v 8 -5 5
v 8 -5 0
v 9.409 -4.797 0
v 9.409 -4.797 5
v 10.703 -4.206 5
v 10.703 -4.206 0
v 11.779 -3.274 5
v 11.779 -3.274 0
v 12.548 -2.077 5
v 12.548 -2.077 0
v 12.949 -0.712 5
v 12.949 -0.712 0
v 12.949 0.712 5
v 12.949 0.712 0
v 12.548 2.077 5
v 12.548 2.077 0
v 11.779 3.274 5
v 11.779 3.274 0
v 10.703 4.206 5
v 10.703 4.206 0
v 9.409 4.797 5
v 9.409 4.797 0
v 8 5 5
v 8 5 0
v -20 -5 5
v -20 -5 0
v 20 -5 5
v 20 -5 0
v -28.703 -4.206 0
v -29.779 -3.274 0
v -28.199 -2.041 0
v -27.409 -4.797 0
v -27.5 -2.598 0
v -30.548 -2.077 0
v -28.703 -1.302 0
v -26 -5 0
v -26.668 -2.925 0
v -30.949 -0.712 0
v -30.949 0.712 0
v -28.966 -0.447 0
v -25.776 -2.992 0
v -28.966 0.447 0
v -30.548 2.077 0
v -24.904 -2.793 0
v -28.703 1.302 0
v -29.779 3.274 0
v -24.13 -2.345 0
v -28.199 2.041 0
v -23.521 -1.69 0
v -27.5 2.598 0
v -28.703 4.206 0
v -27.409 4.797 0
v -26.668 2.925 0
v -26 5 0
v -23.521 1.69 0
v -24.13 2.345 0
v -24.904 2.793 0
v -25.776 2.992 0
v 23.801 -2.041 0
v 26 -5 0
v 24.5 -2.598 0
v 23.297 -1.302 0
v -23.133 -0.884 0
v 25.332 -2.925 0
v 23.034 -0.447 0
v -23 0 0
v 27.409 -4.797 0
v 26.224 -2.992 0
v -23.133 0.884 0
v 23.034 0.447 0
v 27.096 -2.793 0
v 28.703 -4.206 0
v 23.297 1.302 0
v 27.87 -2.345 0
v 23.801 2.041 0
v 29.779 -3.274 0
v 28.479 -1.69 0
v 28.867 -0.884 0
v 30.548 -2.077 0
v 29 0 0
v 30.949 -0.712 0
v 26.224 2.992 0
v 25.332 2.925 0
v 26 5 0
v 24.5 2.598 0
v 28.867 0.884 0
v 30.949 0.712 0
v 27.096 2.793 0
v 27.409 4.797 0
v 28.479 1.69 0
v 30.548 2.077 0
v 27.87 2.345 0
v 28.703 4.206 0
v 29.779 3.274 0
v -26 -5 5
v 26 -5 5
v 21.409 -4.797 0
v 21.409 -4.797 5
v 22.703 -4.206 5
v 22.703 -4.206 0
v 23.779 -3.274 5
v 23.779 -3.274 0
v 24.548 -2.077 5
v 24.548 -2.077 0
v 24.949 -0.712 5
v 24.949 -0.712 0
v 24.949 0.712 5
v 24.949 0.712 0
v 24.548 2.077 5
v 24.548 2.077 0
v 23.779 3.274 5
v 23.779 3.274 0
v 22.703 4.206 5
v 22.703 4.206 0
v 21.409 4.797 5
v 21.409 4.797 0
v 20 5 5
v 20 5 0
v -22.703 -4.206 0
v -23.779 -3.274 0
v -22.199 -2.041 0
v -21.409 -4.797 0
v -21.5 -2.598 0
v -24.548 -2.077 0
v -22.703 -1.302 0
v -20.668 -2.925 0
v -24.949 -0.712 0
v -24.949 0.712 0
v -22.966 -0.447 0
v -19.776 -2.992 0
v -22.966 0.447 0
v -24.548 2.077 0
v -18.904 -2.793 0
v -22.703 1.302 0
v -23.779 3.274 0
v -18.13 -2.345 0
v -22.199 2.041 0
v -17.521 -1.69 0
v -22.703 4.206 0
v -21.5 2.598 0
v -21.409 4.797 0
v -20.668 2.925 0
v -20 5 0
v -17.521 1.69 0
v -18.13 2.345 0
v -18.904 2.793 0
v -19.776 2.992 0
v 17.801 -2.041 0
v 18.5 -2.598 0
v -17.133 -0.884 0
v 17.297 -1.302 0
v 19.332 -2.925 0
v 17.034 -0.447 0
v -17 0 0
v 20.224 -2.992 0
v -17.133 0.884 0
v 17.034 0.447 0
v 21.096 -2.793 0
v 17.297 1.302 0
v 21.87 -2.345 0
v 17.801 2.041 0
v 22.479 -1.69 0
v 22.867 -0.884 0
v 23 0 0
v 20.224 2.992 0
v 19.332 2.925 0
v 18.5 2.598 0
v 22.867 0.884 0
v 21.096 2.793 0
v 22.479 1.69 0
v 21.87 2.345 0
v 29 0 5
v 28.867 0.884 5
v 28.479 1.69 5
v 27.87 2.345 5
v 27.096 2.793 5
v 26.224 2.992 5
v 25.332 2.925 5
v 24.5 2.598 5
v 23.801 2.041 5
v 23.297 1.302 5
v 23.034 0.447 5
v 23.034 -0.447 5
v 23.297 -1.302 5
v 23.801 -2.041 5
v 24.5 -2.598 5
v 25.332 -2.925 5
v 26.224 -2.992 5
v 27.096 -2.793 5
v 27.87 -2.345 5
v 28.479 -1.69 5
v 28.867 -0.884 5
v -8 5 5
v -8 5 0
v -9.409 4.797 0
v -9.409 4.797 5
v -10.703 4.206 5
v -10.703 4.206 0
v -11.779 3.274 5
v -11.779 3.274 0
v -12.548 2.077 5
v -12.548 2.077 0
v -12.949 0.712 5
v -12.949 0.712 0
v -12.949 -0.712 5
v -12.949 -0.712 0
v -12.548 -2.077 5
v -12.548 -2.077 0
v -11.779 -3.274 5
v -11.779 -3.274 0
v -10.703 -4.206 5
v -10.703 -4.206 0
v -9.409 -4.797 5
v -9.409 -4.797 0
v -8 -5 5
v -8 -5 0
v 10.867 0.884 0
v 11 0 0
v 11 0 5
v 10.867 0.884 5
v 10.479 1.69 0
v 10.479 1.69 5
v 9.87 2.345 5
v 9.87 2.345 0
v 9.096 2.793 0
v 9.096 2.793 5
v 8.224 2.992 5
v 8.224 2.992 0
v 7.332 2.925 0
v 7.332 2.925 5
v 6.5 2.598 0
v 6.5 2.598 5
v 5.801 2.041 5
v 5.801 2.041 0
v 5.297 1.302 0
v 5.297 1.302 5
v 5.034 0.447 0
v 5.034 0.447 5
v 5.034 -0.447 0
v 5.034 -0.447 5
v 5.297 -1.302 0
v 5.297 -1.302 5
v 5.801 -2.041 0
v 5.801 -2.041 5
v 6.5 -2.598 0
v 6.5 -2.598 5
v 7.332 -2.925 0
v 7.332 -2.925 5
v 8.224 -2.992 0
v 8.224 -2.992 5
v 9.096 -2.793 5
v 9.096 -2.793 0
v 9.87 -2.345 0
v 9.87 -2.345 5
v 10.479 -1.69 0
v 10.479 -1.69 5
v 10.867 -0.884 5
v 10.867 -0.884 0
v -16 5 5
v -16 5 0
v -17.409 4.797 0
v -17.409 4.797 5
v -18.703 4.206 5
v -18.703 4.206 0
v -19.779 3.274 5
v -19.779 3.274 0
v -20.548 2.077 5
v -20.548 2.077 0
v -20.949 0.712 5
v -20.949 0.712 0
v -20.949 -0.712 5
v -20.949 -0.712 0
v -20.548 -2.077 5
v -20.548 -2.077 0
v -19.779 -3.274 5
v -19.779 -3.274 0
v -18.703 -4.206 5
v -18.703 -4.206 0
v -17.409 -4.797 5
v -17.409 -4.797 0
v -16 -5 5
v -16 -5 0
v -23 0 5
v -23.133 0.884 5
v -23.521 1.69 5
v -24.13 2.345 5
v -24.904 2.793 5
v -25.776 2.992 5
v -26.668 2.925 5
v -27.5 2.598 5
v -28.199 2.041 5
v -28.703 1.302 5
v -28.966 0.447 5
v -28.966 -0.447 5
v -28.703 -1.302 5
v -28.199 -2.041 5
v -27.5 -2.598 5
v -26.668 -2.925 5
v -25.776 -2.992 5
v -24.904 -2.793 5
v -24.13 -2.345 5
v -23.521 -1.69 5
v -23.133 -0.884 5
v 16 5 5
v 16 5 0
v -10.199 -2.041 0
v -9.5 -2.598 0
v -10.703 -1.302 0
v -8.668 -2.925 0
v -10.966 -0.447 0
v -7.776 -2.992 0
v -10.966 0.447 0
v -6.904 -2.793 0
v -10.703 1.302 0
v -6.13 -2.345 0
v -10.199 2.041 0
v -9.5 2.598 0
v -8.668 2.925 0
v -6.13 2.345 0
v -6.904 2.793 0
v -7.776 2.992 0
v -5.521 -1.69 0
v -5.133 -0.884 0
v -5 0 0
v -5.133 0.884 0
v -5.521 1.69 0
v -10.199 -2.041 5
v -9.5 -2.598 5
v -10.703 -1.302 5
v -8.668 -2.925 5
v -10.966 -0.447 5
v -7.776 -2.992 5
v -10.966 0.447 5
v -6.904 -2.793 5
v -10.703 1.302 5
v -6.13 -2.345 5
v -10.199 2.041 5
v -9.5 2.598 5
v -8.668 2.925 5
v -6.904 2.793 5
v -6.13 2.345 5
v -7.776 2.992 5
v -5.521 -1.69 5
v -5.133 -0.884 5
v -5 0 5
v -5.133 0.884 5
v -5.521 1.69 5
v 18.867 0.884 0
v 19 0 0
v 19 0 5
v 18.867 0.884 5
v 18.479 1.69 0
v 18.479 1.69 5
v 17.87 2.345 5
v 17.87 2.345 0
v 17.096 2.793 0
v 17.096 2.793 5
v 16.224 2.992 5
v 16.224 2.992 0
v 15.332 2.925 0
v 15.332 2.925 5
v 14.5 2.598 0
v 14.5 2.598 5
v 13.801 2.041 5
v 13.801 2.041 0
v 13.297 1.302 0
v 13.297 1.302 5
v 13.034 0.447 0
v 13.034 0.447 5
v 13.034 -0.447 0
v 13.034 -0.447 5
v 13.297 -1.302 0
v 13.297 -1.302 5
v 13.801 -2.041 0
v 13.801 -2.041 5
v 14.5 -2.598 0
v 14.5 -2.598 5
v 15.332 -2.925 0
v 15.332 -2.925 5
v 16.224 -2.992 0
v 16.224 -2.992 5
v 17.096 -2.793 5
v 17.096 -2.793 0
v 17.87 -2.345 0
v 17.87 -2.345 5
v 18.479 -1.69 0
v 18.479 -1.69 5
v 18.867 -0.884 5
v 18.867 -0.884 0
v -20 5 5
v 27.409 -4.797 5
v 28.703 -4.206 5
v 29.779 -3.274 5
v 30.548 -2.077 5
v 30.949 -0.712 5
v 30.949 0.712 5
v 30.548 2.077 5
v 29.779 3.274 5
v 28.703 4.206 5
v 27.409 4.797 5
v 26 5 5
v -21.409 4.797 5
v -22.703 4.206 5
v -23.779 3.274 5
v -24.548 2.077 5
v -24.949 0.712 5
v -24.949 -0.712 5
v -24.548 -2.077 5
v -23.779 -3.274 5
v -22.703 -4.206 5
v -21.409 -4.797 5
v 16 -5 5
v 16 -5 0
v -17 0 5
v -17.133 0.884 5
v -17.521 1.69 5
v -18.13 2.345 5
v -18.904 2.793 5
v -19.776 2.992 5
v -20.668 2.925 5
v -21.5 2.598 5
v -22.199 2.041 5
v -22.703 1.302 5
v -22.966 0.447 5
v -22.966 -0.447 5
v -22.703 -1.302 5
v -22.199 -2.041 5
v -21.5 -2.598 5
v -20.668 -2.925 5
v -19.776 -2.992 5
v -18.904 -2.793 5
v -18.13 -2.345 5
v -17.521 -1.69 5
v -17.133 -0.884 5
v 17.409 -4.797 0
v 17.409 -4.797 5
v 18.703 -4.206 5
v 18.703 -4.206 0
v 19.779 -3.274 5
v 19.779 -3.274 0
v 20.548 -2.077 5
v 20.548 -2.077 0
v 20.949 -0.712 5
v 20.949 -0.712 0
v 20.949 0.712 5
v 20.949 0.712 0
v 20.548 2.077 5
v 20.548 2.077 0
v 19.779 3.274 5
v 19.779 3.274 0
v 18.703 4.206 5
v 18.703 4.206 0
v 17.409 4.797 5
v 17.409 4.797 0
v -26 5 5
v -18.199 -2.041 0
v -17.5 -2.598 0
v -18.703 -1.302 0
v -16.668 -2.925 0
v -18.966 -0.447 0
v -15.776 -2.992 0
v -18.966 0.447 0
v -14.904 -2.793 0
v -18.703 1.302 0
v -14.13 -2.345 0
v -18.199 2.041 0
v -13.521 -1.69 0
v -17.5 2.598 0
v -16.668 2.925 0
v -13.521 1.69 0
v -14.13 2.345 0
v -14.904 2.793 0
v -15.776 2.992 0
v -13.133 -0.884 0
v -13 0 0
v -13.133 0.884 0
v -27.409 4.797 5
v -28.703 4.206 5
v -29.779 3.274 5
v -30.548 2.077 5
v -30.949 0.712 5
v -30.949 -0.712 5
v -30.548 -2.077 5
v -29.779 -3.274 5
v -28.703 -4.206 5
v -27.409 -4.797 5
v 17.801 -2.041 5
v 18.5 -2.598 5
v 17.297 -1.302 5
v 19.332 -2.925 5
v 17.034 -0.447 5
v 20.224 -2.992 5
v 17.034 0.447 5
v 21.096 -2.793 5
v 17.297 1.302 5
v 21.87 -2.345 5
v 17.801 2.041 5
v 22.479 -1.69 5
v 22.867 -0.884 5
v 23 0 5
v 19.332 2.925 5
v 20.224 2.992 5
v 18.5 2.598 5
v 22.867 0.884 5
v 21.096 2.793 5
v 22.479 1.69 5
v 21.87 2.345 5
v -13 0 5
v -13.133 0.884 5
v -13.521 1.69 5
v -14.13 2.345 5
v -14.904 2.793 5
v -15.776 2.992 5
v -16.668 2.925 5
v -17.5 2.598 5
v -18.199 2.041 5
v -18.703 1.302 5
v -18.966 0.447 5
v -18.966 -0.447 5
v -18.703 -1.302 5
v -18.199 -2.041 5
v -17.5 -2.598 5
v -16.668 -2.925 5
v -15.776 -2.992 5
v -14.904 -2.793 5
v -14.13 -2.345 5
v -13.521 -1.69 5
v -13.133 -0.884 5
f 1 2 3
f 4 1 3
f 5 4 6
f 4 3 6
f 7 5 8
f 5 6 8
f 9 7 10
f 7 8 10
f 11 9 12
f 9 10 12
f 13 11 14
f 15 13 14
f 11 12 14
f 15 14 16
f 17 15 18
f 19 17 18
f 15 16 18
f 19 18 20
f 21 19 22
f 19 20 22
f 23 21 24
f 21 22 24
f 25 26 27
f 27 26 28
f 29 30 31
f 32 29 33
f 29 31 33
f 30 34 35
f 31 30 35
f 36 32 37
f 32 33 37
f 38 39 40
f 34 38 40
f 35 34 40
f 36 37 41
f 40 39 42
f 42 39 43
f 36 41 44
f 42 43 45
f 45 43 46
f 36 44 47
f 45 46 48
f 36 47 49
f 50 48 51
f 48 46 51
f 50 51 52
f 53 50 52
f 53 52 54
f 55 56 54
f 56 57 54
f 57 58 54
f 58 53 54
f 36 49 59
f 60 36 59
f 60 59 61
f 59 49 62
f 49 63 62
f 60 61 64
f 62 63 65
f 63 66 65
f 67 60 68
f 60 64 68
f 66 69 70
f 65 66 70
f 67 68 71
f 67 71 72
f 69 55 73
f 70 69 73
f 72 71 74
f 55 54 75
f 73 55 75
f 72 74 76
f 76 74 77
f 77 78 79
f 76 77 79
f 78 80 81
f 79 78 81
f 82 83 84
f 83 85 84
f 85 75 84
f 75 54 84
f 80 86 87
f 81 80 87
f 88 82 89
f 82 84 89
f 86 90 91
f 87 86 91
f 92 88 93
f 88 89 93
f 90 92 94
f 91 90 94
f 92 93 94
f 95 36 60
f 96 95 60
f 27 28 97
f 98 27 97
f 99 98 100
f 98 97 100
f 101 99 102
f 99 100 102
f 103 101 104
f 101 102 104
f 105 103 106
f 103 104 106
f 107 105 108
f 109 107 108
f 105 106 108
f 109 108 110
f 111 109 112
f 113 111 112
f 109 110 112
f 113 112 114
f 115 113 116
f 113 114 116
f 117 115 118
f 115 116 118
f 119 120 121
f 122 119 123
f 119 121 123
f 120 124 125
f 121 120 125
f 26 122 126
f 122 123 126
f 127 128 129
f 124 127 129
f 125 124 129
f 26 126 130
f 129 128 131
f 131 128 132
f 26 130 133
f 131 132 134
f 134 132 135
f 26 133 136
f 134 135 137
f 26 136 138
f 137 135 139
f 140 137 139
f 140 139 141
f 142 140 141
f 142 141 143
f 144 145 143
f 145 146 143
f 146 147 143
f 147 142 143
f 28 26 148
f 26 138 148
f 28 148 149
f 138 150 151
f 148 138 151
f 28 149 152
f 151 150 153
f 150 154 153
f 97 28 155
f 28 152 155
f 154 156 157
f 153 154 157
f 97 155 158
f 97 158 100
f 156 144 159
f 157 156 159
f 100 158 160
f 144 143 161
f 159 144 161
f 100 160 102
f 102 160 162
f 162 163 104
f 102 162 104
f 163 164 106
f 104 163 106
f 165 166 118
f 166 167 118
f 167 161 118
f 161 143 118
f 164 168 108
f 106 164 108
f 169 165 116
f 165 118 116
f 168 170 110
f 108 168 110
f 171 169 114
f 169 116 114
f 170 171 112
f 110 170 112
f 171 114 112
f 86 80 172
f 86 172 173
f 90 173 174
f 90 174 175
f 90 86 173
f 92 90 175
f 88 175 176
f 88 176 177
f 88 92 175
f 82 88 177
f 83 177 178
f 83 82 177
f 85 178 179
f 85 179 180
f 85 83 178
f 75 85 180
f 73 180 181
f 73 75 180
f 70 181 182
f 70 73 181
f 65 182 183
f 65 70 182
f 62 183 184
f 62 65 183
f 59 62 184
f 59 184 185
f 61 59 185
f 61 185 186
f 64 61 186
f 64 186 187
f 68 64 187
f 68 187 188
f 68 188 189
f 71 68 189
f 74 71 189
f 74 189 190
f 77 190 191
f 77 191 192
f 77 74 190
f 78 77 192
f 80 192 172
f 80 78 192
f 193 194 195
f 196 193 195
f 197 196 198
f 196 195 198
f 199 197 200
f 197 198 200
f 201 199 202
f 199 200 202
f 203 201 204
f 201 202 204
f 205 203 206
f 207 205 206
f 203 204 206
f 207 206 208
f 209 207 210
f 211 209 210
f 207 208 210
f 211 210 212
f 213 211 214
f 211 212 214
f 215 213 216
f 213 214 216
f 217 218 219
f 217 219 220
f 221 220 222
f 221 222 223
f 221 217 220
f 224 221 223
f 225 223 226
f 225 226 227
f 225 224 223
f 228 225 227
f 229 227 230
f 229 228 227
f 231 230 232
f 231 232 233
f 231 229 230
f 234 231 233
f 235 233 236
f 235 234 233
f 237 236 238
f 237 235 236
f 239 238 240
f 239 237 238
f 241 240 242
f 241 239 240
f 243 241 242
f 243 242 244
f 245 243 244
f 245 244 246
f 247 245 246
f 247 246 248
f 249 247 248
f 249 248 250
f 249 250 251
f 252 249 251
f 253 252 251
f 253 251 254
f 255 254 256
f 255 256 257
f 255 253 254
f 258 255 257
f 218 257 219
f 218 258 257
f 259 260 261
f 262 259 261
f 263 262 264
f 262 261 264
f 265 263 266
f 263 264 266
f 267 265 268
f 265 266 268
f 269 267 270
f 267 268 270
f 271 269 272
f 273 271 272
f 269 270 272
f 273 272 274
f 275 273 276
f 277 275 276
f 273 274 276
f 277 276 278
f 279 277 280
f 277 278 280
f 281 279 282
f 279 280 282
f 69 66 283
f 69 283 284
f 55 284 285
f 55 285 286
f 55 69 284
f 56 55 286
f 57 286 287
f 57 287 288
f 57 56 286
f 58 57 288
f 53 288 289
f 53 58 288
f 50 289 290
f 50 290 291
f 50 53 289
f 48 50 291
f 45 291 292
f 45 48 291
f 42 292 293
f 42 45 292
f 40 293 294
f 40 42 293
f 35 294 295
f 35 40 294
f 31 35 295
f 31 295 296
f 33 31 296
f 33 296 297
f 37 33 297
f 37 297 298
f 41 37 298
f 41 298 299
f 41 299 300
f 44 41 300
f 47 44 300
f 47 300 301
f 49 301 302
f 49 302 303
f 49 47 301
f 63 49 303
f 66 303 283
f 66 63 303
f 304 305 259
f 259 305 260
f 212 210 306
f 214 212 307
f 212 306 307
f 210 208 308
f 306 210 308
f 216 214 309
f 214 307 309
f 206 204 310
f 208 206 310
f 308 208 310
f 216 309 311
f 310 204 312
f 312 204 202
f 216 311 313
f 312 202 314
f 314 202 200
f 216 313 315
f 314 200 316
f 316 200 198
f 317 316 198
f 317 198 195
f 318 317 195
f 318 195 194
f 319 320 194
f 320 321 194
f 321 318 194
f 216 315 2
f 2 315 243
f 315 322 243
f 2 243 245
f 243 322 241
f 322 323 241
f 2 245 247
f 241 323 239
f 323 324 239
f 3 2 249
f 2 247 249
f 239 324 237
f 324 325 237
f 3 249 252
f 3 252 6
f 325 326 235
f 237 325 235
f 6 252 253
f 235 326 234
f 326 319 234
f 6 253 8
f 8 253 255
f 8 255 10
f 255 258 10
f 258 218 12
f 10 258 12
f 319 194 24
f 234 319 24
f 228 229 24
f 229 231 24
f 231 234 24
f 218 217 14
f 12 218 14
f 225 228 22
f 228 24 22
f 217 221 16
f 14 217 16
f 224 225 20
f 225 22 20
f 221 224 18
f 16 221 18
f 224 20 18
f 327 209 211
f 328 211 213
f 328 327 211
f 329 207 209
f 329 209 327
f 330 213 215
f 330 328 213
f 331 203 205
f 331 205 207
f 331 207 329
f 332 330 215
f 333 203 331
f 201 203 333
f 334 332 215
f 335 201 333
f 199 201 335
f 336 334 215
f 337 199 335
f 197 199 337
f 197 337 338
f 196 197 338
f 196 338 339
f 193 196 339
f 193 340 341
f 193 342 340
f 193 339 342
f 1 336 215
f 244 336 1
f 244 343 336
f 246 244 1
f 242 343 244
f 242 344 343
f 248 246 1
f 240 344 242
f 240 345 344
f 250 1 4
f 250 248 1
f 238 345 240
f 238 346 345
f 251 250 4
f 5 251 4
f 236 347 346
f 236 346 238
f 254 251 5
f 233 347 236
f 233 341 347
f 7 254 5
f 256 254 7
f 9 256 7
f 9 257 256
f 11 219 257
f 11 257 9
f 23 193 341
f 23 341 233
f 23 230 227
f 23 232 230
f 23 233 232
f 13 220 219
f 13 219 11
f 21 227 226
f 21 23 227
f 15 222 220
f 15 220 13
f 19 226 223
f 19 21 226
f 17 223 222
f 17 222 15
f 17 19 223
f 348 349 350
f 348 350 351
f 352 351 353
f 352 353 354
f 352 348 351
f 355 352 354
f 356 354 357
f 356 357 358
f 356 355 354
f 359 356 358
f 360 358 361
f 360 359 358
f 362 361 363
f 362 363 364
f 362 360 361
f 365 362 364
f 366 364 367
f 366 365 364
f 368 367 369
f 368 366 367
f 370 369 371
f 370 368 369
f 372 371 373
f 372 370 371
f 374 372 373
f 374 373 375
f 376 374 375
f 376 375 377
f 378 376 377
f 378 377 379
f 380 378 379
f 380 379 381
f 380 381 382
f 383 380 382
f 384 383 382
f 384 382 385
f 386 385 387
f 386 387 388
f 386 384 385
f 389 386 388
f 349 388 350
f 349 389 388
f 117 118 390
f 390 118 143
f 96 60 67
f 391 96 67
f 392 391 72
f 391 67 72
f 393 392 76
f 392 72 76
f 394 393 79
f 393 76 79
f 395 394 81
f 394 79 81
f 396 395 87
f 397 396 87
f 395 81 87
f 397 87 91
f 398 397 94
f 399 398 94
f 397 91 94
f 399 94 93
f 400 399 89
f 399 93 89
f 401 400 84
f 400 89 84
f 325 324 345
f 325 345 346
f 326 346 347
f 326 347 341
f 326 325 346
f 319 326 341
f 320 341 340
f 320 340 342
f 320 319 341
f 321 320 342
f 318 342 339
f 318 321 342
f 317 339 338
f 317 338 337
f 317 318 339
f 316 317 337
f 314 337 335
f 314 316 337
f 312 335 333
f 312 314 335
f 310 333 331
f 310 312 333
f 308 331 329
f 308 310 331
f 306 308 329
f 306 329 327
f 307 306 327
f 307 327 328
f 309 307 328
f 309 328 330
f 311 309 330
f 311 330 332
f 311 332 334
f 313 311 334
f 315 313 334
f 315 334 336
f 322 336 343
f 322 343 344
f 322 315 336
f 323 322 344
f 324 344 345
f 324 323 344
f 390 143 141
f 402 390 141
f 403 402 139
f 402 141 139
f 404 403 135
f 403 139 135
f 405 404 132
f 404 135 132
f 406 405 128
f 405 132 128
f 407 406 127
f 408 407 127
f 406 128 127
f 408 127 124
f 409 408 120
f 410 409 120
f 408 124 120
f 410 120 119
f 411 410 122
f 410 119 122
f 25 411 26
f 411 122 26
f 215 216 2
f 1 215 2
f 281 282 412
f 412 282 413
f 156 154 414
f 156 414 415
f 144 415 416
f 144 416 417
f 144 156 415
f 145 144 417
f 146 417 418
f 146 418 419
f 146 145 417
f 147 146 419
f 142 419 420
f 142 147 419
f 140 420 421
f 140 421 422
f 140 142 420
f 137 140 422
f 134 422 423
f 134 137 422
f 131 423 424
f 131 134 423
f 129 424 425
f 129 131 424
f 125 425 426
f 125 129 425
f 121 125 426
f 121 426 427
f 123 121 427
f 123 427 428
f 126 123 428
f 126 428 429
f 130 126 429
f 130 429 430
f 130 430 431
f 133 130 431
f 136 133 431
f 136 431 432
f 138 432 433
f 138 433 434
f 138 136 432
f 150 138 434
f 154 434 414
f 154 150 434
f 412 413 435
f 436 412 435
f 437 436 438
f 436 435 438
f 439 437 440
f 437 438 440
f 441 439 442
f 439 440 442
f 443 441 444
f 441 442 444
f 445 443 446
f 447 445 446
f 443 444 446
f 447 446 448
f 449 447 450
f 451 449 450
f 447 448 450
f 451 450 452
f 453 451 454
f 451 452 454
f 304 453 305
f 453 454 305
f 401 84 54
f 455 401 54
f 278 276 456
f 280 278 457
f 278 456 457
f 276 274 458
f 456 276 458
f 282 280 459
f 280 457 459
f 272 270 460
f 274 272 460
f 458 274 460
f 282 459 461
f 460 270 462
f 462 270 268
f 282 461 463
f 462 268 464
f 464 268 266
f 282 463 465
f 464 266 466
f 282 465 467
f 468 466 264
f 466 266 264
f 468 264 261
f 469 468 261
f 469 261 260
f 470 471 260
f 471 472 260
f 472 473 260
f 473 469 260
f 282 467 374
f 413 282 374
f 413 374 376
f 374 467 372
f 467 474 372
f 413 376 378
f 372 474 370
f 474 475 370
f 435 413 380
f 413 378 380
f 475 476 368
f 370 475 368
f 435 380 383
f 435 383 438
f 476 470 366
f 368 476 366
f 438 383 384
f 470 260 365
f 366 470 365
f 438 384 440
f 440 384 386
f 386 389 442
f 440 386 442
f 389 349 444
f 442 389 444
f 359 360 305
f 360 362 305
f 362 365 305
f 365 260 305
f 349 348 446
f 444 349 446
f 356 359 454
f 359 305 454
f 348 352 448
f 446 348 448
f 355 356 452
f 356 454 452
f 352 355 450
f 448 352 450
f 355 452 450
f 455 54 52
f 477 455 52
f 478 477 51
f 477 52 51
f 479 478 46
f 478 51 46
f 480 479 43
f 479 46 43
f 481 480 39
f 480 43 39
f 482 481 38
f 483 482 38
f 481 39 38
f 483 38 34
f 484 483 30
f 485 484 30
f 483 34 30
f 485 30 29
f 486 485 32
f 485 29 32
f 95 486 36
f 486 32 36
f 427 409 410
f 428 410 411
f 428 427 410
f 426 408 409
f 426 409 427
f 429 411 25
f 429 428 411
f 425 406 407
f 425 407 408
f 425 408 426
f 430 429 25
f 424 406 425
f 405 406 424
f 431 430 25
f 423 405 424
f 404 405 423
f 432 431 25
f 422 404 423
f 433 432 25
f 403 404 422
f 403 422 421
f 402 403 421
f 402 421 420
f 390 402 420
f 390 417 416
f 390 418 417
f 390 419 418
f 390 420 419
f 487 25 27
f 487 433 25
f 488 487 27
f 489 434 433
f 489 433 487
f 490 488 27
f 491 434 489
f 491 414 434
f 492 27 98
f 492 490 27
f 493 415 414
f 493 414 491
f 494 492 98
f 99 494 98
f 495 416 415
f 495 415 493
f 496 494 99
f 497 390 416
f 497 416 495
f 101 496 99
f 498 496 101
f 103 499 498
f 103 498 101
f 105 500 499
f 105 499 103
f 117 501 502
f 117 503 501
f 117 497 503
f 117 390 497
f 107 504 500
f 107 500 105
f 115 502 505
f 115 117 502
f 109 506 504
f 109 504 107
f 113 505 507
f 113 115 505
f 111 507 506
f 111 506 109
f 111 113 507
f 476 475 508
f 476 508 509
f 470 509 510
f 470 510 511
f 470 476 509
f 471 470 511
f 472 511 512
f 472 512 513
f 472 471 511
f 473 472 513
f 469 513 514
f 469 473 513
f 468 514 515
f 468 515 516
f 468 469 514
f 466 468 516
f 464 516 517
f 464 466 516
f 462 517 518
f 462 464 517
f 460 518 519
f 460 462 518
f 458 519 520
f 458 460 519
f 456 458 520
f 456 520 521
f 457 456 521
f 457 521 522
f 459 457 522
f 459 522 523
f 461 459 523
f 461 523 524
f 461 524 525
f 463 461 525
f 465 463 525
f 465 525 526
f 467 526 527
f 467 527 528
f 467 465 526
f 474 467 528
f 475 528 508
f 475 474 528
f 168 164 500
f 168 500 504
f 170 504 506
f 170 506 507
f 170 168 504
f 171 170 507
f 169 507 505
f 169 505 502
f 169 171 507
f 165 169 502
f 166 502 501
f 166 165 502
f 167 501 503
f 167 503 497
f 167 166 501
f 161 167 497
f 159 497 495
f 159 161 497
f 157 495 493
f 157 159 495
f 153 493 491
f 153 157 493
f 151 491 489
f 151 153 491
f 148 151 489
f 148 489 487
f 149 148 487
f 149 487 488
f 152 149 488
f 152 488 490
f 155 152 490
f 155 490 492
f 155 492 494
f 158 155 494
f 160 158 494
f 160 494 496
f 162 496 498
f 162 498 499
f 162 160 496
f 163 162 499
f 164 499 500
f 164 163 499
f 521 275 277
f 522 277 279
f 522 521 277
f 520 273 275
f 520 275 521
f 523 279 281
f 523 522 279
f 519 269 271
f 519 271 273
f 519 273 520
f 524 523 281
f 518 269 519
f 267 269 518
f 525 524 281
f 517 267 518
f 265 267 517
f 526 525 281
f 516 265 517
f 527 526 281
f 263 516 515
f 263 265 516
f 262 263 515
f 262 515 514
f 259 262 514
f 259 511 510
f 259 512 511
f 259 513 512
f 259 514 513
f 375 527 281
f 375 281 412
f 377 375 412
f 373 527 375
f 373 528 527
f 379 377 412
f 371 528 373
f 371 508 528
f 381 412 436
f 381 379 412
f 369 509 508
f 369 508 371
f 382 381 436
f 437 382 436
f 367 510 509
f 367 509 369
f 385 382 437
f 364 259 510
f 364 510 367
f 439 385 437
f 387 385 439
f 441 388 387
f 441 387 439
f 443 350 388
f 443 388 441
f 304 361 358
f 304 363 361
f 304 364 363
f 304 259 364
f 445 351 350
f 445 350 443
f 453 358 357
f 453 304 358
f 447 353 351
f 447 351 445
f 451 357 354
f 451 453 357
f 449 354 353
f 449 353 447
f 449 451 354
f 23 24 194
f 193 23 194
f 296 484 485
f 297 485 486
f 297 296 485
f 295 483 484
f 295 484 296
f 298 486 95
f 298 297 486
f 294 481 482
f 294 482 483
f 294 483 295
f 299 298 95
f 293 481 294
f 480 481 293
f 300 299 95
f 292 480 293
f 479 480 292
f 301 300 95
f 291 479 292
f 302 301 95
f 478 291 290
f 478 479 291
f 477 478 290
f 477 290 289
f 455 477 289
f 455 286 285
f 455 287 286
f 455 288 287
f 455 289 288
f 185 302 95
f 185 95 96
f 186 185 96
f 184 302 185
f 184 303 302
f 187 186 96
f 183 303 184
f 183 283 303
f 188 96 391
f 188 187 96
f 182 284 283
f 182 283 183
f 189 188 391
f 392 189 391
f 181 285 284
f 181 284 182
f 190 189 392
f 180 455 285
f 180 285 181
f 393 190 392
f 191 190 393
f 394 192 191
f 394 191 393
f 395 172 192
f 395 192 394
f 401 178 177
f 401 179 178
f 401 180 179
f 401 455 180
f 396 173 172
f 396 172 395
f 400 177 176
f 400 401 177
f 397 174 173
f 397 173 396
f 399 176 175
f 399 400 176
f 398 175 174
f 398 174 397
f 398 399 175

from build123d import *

# Parameters (mm, degrees)
SKETCH_R     = 3
PAD_DEPTH    = 5
SKETCH001_R  = 3
PAD001_DEPTH = 5
SKETCH002_R  = 3
PAD002_DEPTH = 5
SKETCH003_R  = 3
PAD003_DEPTH = 5


with BuildPart() as f_16_mm:
    # Sketch → Pad (new body)
    with BuildSketch(Plane.XY):
        with BuildLine():
            ThreePointArc((-8, 5), (-13, 0), (-8, -5))
            Line((-8, -5), (8, -5))
            ThreePointArc((8, -5), (13, 0), (8, 5))
            Line((8, 5), (-8, 5))
        make_face()
        with Locations((8, 0)):
            Circle(SKETCH_R, mode=Mode.SUBTRACT)
        with Locations((-8, 0)):
            Circle(SKETCH_R, mode=Mode.SUBTRACT)
    extrude(amount=PAD_DEPTH)


with BuildPart() as f_32_mm:
    # Sketch001 → Pad001 (new body)
    with BuildSketch(Plane.XY):
        with BuildLine():
            ThreePointArc((-16, 5), (-21, 0), (-16, -5))
            Line((-16, -5), (16, -5))
            ThreePointArc((16, -5), (21, 0), (16, 5))
            Line((16, 5), (-16, 5))
        make_face()
        with Locations((16, 0)):
            Circle(SKETCH001_R, mode=Mode.SUBTRACT)
        with Locations((-16, 0)):
            Circle(SKETCH001_R, mode=Mode.SUBTRACT)
    extrude(amount=PAD001_DEPTH)


with BuildPart() as f_40_mm:
    # Sketch002 → Pad002 (new body)
    with BuildSketch(Plane.XY):
        with BuildLine():
            ThreePointArc((-20, 5), (-25, 0), (-20, -5))
            Line((-20, -5), (20, -5))
            ThreePointArc((20, -5), (25, 0), (20, 5))
            Line((20, 5), (-20, 5))
        make_face()
        with Locations((20, 0)):
            Circle(SKETCH002_R, mode=Mode.SUBTRACT)
        with Locations((-20, 0)):
            Circle(SKETCH002_R, mode=Mode.SUBTRACT)
    extrude(amount=PAD002_DEPTH)


with BuildPart() as f_52_mm:
    # Sketch003 → Pad003 (new body)
    with BuildSketch(Plane.XY):
        with BuildLine():
            ThreePointArc((-26, 5), (-31, 0), (-26, -5))
            Line((-26, -5), (26, -5))
            ThreePointArc((26, -5), (31, 0), (26, 5))
            Line((26, 5), (-26, 5))
        make_face()
        with Locations((26, 0)):
            Circle(SKETCH003_R, mode=Mode.SUBTRACT)
        with Locations((-26, 0)):
            Circle(SKETCH003_R, mode=Mode.SUBTRACT)
    extrude(amount=PAD003_DEPTH)


solid = Compound([f_16_mm.part, f_32_mm.part, f_40_mm.part, f_52_mm.part])
